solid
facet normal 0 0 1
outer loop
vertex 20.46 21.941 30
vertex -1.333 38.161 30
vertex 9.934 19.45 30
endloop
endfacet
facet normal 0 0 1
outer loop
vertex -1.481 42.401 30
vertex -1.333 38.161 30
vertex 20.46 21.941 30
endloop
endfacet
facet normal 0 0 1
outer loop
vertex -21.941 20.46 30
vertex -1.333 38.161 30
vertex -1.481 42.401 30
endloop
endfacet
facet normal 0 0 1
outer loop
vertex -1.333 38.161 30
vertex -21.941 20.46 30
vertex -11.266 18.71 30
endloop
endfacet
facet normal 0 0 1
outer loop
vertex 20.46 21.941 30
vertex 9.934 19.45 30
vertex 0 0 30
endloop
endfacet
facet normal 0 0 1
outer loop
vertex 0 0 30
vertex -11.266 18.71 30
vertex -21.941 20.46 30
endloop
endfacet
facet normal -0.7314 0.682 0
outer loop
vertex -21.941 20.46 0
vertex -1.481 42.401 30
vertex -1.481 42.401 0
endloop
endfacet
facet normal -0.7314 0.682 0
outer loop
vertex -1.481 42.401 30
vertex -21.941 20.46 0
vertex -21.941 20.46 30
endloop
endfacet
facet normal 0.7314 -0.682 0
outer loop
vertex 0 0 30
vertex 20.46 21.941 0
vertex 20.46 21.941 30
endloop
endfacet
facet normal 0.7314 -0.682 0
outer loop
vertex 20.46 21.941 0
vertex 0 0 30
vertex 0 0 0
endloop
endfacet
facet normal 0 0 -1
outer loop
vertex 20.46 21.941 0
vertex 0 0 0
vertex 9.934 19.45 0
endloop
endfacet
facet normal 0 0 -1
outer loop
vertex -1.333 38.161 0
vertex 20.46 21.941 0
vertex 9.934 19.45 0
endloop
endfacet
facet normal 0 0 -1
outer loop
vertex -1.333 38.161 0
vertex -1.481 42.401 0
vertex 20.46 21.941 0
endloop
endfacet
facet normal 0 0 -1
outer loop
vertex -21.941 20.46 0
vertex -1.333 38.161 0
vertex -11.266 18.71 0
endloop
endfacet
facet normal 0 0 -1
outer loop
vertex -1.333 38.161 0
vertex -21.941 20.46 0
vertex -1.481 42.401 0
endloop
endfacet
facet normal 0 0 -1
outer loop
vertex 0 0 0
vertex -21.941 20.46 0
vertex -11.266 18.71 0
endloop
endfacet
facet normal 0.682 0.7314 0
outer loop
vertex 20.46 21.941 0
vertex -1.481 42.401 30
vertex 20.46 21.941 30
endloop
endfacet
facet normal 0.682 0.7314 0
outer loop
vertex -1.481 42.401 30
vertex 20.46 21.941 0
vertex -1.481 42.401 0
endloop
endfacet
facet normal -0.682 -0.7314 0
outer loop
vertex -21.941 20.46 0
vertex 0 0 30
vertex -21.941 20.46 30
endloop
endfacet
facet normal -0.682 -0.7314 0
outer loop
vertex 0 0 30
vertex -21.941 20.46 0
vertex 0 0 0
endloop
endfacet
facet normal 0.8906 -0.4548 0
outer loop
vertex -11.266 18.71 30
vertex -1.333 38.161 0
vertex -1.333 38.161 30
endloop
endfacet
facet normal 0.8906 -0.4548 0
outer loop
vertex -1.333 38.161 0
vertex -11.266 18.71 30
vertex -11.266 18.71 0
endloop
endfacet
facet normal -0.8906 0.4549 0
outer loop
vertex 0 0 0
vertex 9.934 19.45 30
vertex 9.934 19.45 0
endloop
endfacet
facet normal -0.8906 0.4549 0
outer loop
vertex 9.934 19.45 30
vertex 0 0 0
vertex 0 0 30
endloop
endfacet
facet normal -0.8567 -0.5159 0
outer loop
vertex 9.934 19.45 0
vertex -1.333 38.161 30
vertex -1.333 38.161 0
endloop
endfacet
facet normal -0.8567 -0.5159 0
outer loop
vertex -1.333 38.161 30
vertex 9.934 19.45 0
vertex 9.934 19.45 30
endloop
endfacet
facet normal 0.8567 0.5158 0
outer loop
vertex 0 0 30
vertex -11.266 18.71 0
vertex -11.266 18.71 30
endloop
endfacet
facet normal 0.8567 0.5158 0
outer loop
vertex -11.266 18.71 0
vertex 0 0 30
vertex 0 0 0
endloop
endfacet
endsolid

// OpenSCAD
rotate([0,0,2])
rotate([0,-90,0]){
    difference(){
        rotate([-45,0,0]) {
            cube([30, 30, 30]);
        }
        scale([1,0.9,0.5]) {
            rotate([-45,0,0]) {
                cube([30, 30, 30]);
            }
        }
    }
}
